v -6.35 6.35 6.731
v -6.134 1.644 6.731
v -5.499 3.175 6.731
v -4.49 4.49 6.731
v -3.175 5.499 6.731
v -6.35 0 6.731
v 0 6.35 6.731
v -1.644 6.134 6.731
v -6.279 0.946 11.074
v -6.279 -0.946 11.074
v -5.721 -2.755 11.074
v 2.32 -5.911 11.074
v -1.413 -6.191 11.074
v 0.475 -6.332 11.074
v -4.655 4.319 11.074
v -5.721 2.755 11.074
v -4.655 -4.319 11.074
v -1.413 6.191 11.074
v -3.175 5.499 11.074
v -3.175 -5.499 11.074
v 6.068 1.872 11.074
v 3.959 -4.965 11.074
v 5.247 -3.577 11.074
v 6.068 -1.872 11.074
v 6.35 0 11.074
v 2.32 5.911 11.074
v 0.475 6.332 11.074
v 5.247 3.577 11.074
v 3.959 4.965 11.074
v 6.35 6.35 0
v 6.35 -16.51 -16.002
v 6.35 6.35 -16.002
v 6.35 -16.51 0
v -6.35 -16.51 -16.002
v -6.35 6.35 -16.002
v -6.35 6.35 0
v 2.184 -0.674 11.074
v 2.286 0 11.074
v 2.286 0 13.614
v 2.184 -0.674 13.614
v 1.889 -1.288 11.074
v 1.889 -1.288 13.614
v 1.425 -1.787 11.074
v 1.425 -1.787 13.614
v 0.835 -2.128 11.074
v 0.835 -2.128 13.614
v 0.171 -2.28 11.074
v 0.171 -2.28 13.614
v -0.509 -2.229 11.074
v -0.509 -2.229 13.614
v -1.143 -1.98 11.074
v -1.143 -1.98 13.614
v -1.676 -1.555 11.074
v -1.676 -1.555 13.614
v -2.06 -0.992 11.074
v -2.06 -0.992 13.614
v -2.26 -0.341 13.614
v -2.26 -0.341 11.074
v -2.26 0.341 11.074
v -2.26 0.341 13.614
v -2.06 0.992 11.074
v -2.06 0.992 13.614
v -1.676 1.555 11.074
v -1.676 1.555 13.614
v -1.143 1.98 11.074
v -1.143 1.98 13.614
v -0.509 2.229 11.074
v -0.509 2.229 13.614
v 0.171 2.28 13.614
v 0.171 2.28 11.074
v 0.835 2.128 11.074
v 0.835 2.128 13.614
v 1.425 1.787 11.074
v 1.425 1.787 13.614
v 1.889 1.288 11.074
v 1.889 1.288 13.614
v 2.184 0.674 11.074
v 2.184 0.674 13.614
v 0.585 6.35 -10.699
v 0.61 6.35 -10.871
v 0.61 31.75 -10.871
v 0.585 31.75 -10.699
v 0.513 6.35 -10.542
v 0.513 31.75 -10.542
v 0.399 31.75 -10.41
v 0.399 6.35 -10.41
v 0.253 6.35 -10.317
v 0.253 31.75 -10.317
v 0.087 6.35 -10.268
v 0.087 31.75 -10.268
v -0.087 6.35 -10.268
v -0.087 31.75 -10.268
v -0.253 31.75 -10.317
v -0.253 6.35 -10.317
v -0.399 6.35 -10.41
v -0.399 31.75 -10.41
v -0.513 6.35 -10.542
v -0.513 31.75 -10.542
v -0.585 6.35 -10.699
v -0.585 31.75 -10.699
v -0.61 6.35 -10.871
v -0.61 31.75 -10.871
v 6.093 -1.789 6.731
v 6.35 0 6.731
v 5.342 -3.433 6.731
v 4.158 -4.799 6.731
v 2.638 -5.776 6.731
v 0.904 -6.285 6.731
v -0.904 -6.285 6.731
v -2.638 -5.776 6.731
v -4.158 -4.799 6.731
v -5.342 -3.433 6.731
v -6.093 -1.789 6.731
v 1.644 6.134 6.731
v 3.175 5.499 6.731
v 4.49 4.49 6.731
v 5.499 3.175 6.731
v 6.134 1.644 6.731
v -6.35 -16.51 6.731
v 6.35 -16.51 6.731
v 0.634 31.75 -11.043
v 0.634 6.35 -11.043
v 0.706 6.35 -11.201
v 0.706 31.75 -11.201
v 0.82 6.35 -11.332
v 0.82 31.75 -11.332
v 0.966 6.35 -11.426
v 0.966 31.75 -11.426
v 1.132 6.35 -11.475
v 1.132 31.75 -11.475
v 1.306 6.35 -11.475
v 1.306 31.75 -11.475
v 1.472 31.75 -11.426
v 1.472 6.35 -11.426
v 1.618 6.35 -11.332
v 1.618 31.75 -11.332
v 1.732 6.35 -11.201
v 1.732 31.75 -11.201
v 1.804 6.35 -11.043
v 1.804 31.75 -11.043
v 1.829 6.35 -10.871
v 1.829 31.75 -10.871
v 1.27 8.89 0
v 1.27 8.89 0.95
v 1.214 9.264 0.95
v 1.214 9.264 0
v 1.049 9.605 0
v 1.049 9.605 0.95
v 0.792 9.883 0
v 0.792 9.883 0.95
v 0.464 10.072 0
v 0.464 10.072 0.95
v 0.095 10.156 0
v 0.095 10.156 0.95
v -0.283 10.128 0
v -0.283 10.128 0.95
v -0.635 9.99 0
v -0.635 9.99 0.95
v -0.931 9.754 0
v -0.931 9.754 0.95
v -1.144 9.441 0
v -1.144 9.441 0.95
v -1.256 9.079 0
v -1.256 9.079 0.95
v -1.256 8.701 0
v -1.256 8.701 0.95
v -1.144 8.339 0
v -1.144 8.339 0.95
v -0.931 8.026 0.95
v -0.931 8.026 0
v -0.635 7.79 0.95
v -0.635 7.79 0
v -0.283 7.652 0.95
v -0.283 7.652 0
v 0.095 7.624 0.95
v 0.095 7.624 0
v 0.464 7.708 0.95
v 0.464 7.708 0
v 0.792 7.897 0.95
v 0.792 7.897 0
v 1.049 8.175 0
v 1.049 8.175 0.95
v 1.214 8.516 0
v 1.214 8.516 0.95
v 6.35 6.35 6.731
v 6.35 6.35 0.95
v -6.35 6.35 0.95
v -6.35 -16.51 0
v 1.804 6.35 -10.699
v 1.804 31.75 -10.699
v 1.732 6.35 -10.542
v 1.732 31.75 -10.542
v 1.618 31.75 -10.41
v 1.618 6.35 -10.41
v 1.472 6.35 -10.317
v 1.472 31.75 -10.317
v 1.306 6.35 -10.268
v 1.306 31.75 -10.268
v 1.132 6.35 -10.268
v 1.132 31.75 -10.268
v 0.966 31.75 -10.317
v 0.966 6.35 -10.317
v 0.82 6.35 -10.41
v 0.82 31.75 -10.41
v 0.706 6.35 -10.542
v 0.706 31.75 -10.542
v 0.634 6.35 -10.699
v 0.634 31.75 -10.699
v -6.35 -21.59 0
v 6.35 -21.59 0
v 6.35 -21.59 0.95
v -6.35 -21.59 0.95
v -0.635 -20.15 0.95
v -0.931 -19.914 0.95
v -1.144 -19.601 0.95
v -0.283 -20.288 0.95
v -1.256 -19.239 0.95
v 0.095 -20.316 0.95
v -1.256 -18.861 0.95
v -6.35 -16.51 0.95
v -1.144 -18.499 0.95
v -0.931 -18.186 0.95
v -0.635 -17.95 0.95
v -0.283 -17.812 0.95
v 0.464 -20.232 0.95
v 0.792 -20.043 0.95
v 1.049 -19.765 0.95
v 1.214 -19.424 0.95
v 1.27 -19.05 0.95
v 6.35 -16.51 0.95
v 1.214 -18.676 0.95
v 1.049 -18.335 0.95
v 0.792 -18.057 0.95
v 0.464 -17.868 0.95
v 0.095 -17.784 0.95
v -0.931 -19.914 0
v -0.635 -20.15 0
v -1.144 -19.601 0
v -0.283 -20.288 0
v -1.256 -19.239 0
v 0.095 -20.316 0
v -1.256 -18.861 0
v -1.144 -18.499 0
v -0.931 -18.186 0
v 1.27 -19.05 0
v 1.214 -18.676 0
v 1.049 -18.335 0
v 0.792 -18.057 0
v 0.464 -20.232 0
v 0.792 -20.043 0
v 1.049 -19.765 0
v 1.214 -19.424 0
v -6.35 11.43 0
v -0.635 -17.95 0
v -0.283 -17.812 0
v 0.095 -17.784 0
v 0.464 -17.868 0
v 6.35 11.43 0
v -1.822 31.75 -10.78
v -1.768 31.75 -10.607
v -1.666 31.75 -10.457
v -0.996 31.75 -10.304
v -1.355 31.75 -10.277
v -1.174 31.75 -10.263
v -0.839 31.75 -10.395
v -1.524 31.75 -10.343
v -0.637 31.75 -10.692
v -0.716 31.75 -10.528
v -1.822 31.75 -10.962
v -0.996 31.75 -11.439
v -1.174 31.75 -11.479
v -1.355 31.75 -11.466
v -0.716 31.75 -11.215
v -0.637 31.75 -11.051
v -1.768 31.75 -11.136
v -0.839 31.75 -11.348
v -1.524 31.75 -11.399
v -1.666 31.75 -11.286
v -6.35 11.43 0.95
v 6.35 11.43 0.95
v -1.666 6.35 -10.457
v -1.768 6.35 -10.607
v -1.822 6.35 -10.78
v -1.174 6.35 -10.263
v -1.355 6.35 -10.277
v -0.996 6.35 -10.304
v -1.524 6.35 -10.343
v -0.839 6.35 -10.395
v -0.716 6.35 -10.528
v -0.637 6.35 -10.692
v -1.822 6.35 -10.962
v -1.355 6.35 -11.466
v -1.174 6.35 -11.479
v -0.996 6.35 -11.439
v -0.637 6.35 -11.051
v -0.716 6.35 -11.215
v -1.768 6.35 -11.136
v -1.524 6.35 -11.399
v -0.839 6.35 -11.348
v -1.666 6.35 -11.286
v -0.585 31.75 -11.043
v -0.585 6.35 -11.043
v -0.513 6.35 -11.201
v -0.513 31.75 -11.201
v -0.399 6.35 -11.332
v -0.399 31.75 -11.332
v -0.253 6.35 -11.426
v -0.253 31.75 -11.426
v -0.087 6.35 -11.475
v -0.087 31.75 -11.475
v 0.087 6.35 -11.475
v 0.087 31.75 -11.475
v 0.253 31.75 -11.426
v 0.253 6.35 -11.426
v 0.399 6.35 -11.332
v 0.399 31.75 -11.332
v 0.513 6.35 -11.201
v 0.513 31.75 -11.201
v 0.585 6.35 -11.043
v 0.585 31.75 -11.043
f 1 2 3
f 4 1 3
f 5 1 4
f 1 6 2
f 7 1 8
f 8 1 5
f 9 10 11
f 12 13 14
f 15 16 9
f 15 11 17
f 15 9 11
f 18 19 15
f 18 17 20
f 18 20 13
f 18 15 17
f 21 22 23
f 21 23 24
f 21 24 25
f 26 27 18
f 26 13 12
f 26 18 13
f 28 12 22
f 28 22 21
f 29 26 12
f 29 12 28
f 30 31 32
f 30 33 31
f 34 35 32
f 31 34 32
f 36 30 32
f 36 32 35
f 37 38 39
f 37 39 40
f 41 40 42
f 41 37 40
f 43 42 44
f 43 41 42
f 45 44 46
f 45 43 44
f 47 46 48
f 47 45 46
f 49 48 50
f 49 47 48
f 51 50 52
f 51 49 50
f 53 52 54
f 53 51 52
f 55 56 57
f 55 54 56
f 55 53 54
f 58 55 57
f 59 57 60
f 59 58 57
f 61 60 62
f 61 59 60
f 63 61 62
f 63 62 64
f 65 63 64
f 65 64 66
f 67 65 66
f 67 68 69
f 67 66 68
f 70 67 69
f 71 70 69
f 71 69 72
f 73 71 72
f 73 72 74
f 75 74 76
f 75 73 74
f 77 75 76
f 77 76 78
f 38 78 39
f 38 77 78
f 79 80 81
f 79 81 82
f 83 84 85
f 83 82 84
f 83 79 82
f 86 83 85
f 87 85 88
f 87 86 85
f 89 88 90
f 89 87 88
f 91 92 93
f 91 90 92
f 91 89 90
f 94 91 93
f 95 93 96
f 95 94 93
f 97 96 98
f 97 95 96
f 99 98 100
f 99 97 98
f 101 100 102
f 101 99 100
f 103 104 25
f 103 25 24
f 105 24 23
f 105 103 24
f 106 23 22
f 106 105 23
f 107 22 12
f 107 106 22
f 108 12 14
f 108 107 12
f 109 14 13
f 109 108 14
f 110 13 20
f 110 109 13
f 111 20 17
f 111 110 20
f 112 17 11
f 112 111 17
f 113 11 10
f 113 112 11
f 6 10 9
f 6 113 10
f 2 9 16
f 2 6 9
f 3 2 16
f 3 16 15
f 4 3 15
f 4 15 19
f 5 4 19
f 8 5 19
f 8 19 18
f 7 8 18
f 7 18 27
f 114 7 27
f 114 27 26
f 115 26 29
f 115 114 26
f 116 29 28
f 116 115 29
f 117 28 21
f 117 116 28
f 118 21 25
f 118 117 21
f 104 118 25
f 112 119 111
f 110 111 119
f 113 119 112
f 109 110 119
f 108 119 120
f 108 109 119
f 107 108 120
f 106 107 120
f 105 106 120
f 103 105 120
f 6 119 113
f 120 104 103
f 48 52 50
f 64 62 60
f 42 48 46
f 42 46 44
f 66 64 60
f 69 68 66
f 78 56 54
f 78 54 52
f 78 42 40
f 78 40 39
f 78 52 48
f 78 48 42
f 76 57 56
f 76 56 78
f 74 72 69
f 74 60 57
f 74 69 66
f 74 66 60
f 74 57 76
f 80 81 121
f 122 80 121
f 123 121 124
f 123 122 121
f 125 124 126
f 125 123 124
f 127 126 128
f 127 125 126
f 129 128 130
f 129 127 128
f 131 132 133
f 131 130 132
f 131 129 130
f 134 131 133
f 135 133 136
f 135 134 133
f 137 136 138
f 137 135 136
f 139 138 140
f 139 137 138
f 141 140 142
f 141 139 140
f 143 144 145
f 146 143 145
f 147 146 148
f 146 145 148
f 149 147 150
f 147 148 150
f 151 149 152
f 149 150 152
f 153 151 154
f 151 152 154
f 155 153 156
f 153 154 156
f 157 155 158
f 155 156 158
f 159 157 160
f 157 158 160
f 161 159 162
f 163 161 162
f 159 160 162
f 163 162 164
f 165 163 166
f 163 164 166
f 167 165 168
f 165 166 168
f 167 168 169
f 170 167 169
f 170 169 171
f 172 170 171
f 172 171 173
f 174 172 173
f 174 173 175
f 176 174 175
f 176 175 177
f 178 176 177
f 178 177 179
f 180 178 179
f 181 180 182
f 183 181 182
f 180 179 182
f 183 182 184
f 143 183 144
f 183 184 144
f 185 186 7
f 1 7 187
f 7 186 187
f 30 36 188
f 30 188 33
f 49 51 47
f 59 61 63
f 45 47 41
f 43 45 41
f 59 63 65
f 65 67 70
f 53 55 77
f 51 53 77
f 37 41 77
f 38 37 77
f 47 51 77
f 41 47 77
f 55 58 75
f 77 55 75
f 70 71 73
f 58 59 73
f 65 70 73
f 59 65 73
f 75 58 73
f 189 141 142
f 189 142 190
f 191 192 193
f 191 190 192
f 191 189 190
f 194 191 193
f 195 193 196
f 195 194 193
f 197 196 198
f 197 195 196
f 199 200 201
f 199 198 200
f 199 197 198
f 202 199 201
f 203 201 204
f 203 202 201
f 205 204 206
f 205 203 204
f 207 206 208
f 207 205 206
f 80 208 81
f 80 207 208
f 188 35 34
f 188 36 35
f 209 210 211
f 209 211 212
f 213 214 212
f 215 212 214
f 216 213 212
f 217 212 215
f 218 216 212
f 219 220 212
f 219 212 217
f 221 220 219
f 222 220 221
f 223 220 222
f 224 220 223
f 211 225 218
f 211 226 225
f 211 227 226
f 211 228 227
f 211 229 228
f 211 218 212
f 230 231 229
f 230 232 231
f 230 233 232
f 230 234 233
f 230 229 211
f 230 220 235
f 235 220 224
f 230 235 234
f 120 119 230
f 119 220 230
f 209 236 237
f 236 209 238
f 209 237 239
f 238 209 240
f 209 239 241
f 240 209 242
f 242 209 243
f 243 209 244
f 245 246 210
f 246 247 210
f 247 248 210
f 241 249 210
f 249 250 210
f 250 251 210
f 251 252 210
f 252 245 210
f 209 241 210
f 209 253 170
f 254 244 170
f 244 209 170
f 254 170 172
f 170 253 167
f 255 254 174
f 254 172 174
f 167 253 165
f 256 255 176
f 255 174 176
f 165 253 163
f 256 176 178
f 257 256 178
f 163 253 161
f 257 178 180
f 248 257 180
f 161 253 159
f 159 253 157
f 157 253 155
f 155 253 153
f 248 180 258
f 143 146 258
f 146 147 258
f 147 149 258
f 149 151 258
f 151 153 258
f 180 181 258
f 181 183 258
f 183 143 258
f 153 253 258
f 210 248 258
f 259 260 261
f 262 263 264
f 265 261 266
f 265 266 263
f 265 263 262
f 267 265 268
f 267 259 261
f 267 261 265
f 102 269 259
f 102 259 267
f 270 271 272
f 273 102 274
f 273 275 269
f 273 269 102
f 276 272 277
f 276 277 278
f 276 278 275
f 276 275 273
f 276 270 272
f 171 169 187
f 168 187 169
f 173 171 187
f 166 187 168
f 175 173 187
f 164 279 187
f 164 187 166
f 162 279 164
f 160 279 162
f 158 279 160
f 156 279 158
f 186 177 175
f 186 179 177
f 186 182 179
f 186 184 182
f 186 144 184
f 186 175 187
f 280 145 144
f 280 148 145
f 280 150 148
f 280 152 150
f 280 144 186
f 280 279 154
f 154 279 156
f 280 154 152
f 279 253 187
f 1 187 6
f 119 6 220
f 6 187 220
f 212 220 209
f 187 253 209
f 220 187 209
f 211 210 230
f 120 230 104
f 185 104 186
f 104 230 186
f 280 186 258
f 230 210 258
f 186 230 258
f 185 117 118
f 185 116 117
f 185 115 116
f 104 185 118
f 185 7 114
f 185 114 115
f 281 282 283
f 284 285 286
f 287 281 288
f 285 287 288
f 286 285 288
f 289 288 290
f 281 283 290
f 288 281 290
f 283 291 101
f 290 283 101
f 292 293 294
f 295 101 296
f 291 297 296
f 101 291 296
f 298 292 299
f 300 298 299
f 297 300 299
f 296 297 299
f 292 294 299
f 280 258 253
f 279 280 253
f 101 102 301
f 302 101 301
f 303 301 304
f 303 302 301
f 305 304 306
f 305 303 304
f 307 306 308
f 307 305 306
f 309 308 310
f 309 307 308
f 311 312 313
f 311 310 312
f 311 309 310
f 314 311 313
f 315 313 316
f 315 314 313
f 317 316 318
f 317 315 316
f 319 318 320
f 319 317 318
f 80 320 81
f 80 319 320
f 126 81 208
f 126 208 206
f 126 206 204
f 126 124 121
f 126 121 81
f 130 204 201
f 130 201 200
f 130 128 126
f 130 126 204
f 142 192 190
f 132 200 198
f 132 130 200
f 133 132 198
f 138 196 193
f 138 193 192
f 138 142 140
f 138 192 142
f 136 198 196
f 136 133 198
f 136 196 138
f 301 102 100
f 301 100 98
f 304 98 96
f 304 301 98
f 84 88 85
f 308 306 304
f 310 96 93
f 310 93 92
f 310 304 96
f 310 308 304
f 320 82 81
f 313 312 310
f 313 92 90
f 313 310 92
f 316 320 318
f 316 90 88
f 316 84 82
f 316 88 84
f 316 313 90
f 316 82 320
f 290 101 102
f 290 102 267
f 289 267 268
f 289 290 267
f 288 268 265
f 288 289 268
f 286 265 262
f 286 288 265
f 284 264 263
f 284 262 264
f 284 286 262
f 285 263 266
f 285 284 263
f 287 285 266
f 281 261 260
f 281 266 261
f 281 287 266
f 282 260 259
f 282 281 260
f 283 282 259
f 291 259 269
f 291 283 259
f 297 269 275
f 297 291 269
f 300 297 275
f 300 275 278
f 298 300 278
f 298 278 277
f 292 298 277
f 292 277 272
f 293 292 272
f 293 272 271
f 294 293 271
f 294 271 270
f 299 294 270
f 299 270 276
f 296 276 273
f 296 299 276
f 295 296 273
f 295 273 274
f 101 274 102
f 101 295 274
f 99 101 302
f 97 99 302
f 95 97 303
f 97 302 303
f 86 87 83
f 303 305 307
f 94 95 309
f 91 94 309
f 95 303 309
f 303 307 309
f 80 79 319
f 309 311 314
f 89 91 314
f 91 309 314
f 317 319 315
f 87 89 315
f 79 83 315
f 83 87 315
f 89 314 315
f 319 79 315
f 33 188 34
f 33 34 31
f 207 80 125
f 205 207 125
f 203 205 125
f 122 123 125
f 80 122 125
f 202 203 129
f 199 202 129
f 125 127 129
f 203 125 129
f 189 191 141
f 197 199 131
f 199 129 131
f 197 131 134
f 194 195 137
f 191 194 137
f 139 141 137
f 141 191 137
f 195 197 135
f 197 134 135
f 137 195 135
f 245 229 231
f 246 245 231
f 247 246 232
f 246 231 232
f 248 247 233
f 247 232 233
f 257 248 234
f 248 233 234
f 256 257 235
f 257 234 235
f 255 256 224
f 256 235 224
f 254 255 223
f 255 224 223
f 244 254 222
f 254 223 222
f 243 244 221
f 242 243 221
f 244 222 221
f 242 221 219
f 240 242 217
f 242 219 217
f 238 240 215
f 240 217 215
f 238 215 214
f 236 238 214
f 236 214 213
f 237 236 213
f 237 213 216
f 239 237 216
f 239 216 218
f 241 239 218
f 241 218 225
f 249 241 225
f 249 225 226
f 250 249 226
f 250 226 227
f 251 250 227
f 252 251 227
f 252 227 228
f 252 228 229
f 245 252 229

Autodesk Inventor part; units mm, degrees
ref_plane "YZ Plane" through (0, 0, 0) normal (1, 0, 0) x (0, 1, 0)
ref_plane "XZ Plane" through (0, 0, 0) normal (0, 1, 0) x (-1, 0, 0)
ref_plane "XY Plane" through (0, 0, 0) normal (0, 0, 1) x (1, 0, 0)
sketch "Sketch1" plane through (0, 0, 0) normal (0, 0, 1) x (1, 0, 0)
  line L0 (-6.35, -16.51) -> (6.35, -16.51)
  line L1 (6.35, -16.51) -> (6.35, 0)
  line L2 (6.35, 6.35) -> (-6.35, 6.35)
  line L3 (-6.35, 6.35) -> (-6.35, 0)
  circle A0 centre (0, 0) radius 6.35
  line L4 (-6.35, 0) -> (-6.35, -16.51)
  line L5 (6.35, 0) -> (6.35, 6.35)
  circle A1 centre (0, 0) radius 2.286
  point P0 (0, 6.35)
  dimension "d0" = 12.7
  dimension "d1" = 22.86
  dimension "d3" = 4.572
extrude "Extrusion1" add sketch "Sketch1" against normal blind 16.002 contours L4 A0 L1 L0 | A0 | L3 L2 A0 | A0 L2 L5 | A1
extrude "Extrusion2" add sketch "Sketch1" along normal blind 6.731 separate body contours L4 A0 L1 L0 | A0 | L3 L2 A0 | A0 L2 L5 | A1
sketch "Sketch2" plane through (0, 0, 6.731) normal (0, 0, 1) x (1, 0, 0)
  circle A0 centre (0, 0) radius 6.35 projected
  circle A1 centre (0, 0) radius 2.286 projected
sketch "Sketch3" plane through (0, 0, 0) normal (0, 0, 1) x (1, 0, 0)
  line L0 (-6.35, 6.35) -> (6.35, 6.35)
  line L1 (6.35, 6.35) -> (6.35, 11.43)
  line L2 (6.35, 11.43) -> (-6.35, 11.43)
  line L3 (-6.35, 11.43) -> (-6.35, 6.35)
  line L4 (-6.35, -16.51) -> (6.35, -16.51)
  line L5 (6.35, -16.51) -> (6.35, -21.59)
  line L6 (6.35, -21.59) -> (-6.35, -21.59)
  line L7 (-6.35, -21.59) -> (-6.35, -16.51)
  line L8 (6.35, -16.51) -> (6.35, 6.35) projected
  point P0 (0, 0)
  dimension "d8" = 5.08
extrude "Extrusion3" add sketch "Sketch3" along normal blind 0.95 bodies 2
sketch "Sketch4" plane through (0, 0, 0.95) normal (0, 0, 1) x (1, 0, 0)
  line L0 (6.35, 6.35) -> (-6.35, 6.35) projected
  line L1 (6.35, 6.35) -> (6.35, 11.43) projected
  line L2 (6.35, 11.43) -> (-6.35, 11.43) projected
  line L3 (-6.35, 11.43) -> (-6.35, 6.35) projected
  line L4 (-6.35, -16.51) -> (6.35, -16.51) projected
  line L5 (-6.35, -16.51) -> (-6.35, -21.59) projected
  line L6 (-6.35, -21.59) -> (6.35, -21.59) projected
  line L7 (6.35, -21.59) -> (6.35, -16.51) projected
  circle A0 centre (0, 8.89) radius 1.27
  circle A1 centre (0, -19.05) radius 1.27
  point P0 (0, 0)
  point P1 (0, 11.43)
  point P2 (0, -21.59)
  point P3 (6.35, -19.05)
  point P4 (6.35, 8.89)
  dimension "d11" = 2.54
extrude "Extrusion4" cut sketch "Sketch4" against normal through all contours A0 | A1 bodies 2
extrude "Extrusion5" add sketch "Sketch2" along normal blind 4.3434 contours A0 | A1 bodies 2
sketch "Sketch5" plane through (0, 0, 11.0744) normal (0, 0, 1) x (1, 0, 0)
  circle A0 centre (0, 0) radius 2.286 projected
extrude "Extrusion6" add sketch "Sketch5" along normal blind 2.54 separate body
sketch "Sketch6" plane through (-6.35, 6.35, 0) normal (0, 1, 0) x (1, 0, 0)
  line L0 (12.7, 0) -> (0, 0) projected
  line L1 (12.7, 0) -> (12.7, 16.002) projected
  line L2 (0, 16.002) -> (12.7, 16.002) projected
  line L3 (0, 0) -> (0, 16.002) projected
  circle A0 centre (7.5692, 10.8712) radius 0.6096
  circle A1 centre (6.35, 10.8712) radius 0.6096
  circle A2 centre (5.1308, 10.8712) radius 0.6096
  line L4 (6.35, 10.8712) -> (6.35, 11.4808) construction
  line L5 (6.35, 11.4808) -> (6.35, 16.002) construction
  point P0 (6.35, 0)
  dimension "d18" = 1.2192
  dimension "d19" = 4.5212
extrude "Extrusion7" add sketch "Sketch6" along normal blind 25.4 separate body contours A0
extrude "Extrusion8" add sketch "Sketch6" along normal up to surface (25.4 mm away) separate body contours A1
extrude "Extrusion9" add sketch "Sketch6" along normal up to surface (25.4 mm away) separate body contours A2
properties part number "servo-micro tower pro 9g"
